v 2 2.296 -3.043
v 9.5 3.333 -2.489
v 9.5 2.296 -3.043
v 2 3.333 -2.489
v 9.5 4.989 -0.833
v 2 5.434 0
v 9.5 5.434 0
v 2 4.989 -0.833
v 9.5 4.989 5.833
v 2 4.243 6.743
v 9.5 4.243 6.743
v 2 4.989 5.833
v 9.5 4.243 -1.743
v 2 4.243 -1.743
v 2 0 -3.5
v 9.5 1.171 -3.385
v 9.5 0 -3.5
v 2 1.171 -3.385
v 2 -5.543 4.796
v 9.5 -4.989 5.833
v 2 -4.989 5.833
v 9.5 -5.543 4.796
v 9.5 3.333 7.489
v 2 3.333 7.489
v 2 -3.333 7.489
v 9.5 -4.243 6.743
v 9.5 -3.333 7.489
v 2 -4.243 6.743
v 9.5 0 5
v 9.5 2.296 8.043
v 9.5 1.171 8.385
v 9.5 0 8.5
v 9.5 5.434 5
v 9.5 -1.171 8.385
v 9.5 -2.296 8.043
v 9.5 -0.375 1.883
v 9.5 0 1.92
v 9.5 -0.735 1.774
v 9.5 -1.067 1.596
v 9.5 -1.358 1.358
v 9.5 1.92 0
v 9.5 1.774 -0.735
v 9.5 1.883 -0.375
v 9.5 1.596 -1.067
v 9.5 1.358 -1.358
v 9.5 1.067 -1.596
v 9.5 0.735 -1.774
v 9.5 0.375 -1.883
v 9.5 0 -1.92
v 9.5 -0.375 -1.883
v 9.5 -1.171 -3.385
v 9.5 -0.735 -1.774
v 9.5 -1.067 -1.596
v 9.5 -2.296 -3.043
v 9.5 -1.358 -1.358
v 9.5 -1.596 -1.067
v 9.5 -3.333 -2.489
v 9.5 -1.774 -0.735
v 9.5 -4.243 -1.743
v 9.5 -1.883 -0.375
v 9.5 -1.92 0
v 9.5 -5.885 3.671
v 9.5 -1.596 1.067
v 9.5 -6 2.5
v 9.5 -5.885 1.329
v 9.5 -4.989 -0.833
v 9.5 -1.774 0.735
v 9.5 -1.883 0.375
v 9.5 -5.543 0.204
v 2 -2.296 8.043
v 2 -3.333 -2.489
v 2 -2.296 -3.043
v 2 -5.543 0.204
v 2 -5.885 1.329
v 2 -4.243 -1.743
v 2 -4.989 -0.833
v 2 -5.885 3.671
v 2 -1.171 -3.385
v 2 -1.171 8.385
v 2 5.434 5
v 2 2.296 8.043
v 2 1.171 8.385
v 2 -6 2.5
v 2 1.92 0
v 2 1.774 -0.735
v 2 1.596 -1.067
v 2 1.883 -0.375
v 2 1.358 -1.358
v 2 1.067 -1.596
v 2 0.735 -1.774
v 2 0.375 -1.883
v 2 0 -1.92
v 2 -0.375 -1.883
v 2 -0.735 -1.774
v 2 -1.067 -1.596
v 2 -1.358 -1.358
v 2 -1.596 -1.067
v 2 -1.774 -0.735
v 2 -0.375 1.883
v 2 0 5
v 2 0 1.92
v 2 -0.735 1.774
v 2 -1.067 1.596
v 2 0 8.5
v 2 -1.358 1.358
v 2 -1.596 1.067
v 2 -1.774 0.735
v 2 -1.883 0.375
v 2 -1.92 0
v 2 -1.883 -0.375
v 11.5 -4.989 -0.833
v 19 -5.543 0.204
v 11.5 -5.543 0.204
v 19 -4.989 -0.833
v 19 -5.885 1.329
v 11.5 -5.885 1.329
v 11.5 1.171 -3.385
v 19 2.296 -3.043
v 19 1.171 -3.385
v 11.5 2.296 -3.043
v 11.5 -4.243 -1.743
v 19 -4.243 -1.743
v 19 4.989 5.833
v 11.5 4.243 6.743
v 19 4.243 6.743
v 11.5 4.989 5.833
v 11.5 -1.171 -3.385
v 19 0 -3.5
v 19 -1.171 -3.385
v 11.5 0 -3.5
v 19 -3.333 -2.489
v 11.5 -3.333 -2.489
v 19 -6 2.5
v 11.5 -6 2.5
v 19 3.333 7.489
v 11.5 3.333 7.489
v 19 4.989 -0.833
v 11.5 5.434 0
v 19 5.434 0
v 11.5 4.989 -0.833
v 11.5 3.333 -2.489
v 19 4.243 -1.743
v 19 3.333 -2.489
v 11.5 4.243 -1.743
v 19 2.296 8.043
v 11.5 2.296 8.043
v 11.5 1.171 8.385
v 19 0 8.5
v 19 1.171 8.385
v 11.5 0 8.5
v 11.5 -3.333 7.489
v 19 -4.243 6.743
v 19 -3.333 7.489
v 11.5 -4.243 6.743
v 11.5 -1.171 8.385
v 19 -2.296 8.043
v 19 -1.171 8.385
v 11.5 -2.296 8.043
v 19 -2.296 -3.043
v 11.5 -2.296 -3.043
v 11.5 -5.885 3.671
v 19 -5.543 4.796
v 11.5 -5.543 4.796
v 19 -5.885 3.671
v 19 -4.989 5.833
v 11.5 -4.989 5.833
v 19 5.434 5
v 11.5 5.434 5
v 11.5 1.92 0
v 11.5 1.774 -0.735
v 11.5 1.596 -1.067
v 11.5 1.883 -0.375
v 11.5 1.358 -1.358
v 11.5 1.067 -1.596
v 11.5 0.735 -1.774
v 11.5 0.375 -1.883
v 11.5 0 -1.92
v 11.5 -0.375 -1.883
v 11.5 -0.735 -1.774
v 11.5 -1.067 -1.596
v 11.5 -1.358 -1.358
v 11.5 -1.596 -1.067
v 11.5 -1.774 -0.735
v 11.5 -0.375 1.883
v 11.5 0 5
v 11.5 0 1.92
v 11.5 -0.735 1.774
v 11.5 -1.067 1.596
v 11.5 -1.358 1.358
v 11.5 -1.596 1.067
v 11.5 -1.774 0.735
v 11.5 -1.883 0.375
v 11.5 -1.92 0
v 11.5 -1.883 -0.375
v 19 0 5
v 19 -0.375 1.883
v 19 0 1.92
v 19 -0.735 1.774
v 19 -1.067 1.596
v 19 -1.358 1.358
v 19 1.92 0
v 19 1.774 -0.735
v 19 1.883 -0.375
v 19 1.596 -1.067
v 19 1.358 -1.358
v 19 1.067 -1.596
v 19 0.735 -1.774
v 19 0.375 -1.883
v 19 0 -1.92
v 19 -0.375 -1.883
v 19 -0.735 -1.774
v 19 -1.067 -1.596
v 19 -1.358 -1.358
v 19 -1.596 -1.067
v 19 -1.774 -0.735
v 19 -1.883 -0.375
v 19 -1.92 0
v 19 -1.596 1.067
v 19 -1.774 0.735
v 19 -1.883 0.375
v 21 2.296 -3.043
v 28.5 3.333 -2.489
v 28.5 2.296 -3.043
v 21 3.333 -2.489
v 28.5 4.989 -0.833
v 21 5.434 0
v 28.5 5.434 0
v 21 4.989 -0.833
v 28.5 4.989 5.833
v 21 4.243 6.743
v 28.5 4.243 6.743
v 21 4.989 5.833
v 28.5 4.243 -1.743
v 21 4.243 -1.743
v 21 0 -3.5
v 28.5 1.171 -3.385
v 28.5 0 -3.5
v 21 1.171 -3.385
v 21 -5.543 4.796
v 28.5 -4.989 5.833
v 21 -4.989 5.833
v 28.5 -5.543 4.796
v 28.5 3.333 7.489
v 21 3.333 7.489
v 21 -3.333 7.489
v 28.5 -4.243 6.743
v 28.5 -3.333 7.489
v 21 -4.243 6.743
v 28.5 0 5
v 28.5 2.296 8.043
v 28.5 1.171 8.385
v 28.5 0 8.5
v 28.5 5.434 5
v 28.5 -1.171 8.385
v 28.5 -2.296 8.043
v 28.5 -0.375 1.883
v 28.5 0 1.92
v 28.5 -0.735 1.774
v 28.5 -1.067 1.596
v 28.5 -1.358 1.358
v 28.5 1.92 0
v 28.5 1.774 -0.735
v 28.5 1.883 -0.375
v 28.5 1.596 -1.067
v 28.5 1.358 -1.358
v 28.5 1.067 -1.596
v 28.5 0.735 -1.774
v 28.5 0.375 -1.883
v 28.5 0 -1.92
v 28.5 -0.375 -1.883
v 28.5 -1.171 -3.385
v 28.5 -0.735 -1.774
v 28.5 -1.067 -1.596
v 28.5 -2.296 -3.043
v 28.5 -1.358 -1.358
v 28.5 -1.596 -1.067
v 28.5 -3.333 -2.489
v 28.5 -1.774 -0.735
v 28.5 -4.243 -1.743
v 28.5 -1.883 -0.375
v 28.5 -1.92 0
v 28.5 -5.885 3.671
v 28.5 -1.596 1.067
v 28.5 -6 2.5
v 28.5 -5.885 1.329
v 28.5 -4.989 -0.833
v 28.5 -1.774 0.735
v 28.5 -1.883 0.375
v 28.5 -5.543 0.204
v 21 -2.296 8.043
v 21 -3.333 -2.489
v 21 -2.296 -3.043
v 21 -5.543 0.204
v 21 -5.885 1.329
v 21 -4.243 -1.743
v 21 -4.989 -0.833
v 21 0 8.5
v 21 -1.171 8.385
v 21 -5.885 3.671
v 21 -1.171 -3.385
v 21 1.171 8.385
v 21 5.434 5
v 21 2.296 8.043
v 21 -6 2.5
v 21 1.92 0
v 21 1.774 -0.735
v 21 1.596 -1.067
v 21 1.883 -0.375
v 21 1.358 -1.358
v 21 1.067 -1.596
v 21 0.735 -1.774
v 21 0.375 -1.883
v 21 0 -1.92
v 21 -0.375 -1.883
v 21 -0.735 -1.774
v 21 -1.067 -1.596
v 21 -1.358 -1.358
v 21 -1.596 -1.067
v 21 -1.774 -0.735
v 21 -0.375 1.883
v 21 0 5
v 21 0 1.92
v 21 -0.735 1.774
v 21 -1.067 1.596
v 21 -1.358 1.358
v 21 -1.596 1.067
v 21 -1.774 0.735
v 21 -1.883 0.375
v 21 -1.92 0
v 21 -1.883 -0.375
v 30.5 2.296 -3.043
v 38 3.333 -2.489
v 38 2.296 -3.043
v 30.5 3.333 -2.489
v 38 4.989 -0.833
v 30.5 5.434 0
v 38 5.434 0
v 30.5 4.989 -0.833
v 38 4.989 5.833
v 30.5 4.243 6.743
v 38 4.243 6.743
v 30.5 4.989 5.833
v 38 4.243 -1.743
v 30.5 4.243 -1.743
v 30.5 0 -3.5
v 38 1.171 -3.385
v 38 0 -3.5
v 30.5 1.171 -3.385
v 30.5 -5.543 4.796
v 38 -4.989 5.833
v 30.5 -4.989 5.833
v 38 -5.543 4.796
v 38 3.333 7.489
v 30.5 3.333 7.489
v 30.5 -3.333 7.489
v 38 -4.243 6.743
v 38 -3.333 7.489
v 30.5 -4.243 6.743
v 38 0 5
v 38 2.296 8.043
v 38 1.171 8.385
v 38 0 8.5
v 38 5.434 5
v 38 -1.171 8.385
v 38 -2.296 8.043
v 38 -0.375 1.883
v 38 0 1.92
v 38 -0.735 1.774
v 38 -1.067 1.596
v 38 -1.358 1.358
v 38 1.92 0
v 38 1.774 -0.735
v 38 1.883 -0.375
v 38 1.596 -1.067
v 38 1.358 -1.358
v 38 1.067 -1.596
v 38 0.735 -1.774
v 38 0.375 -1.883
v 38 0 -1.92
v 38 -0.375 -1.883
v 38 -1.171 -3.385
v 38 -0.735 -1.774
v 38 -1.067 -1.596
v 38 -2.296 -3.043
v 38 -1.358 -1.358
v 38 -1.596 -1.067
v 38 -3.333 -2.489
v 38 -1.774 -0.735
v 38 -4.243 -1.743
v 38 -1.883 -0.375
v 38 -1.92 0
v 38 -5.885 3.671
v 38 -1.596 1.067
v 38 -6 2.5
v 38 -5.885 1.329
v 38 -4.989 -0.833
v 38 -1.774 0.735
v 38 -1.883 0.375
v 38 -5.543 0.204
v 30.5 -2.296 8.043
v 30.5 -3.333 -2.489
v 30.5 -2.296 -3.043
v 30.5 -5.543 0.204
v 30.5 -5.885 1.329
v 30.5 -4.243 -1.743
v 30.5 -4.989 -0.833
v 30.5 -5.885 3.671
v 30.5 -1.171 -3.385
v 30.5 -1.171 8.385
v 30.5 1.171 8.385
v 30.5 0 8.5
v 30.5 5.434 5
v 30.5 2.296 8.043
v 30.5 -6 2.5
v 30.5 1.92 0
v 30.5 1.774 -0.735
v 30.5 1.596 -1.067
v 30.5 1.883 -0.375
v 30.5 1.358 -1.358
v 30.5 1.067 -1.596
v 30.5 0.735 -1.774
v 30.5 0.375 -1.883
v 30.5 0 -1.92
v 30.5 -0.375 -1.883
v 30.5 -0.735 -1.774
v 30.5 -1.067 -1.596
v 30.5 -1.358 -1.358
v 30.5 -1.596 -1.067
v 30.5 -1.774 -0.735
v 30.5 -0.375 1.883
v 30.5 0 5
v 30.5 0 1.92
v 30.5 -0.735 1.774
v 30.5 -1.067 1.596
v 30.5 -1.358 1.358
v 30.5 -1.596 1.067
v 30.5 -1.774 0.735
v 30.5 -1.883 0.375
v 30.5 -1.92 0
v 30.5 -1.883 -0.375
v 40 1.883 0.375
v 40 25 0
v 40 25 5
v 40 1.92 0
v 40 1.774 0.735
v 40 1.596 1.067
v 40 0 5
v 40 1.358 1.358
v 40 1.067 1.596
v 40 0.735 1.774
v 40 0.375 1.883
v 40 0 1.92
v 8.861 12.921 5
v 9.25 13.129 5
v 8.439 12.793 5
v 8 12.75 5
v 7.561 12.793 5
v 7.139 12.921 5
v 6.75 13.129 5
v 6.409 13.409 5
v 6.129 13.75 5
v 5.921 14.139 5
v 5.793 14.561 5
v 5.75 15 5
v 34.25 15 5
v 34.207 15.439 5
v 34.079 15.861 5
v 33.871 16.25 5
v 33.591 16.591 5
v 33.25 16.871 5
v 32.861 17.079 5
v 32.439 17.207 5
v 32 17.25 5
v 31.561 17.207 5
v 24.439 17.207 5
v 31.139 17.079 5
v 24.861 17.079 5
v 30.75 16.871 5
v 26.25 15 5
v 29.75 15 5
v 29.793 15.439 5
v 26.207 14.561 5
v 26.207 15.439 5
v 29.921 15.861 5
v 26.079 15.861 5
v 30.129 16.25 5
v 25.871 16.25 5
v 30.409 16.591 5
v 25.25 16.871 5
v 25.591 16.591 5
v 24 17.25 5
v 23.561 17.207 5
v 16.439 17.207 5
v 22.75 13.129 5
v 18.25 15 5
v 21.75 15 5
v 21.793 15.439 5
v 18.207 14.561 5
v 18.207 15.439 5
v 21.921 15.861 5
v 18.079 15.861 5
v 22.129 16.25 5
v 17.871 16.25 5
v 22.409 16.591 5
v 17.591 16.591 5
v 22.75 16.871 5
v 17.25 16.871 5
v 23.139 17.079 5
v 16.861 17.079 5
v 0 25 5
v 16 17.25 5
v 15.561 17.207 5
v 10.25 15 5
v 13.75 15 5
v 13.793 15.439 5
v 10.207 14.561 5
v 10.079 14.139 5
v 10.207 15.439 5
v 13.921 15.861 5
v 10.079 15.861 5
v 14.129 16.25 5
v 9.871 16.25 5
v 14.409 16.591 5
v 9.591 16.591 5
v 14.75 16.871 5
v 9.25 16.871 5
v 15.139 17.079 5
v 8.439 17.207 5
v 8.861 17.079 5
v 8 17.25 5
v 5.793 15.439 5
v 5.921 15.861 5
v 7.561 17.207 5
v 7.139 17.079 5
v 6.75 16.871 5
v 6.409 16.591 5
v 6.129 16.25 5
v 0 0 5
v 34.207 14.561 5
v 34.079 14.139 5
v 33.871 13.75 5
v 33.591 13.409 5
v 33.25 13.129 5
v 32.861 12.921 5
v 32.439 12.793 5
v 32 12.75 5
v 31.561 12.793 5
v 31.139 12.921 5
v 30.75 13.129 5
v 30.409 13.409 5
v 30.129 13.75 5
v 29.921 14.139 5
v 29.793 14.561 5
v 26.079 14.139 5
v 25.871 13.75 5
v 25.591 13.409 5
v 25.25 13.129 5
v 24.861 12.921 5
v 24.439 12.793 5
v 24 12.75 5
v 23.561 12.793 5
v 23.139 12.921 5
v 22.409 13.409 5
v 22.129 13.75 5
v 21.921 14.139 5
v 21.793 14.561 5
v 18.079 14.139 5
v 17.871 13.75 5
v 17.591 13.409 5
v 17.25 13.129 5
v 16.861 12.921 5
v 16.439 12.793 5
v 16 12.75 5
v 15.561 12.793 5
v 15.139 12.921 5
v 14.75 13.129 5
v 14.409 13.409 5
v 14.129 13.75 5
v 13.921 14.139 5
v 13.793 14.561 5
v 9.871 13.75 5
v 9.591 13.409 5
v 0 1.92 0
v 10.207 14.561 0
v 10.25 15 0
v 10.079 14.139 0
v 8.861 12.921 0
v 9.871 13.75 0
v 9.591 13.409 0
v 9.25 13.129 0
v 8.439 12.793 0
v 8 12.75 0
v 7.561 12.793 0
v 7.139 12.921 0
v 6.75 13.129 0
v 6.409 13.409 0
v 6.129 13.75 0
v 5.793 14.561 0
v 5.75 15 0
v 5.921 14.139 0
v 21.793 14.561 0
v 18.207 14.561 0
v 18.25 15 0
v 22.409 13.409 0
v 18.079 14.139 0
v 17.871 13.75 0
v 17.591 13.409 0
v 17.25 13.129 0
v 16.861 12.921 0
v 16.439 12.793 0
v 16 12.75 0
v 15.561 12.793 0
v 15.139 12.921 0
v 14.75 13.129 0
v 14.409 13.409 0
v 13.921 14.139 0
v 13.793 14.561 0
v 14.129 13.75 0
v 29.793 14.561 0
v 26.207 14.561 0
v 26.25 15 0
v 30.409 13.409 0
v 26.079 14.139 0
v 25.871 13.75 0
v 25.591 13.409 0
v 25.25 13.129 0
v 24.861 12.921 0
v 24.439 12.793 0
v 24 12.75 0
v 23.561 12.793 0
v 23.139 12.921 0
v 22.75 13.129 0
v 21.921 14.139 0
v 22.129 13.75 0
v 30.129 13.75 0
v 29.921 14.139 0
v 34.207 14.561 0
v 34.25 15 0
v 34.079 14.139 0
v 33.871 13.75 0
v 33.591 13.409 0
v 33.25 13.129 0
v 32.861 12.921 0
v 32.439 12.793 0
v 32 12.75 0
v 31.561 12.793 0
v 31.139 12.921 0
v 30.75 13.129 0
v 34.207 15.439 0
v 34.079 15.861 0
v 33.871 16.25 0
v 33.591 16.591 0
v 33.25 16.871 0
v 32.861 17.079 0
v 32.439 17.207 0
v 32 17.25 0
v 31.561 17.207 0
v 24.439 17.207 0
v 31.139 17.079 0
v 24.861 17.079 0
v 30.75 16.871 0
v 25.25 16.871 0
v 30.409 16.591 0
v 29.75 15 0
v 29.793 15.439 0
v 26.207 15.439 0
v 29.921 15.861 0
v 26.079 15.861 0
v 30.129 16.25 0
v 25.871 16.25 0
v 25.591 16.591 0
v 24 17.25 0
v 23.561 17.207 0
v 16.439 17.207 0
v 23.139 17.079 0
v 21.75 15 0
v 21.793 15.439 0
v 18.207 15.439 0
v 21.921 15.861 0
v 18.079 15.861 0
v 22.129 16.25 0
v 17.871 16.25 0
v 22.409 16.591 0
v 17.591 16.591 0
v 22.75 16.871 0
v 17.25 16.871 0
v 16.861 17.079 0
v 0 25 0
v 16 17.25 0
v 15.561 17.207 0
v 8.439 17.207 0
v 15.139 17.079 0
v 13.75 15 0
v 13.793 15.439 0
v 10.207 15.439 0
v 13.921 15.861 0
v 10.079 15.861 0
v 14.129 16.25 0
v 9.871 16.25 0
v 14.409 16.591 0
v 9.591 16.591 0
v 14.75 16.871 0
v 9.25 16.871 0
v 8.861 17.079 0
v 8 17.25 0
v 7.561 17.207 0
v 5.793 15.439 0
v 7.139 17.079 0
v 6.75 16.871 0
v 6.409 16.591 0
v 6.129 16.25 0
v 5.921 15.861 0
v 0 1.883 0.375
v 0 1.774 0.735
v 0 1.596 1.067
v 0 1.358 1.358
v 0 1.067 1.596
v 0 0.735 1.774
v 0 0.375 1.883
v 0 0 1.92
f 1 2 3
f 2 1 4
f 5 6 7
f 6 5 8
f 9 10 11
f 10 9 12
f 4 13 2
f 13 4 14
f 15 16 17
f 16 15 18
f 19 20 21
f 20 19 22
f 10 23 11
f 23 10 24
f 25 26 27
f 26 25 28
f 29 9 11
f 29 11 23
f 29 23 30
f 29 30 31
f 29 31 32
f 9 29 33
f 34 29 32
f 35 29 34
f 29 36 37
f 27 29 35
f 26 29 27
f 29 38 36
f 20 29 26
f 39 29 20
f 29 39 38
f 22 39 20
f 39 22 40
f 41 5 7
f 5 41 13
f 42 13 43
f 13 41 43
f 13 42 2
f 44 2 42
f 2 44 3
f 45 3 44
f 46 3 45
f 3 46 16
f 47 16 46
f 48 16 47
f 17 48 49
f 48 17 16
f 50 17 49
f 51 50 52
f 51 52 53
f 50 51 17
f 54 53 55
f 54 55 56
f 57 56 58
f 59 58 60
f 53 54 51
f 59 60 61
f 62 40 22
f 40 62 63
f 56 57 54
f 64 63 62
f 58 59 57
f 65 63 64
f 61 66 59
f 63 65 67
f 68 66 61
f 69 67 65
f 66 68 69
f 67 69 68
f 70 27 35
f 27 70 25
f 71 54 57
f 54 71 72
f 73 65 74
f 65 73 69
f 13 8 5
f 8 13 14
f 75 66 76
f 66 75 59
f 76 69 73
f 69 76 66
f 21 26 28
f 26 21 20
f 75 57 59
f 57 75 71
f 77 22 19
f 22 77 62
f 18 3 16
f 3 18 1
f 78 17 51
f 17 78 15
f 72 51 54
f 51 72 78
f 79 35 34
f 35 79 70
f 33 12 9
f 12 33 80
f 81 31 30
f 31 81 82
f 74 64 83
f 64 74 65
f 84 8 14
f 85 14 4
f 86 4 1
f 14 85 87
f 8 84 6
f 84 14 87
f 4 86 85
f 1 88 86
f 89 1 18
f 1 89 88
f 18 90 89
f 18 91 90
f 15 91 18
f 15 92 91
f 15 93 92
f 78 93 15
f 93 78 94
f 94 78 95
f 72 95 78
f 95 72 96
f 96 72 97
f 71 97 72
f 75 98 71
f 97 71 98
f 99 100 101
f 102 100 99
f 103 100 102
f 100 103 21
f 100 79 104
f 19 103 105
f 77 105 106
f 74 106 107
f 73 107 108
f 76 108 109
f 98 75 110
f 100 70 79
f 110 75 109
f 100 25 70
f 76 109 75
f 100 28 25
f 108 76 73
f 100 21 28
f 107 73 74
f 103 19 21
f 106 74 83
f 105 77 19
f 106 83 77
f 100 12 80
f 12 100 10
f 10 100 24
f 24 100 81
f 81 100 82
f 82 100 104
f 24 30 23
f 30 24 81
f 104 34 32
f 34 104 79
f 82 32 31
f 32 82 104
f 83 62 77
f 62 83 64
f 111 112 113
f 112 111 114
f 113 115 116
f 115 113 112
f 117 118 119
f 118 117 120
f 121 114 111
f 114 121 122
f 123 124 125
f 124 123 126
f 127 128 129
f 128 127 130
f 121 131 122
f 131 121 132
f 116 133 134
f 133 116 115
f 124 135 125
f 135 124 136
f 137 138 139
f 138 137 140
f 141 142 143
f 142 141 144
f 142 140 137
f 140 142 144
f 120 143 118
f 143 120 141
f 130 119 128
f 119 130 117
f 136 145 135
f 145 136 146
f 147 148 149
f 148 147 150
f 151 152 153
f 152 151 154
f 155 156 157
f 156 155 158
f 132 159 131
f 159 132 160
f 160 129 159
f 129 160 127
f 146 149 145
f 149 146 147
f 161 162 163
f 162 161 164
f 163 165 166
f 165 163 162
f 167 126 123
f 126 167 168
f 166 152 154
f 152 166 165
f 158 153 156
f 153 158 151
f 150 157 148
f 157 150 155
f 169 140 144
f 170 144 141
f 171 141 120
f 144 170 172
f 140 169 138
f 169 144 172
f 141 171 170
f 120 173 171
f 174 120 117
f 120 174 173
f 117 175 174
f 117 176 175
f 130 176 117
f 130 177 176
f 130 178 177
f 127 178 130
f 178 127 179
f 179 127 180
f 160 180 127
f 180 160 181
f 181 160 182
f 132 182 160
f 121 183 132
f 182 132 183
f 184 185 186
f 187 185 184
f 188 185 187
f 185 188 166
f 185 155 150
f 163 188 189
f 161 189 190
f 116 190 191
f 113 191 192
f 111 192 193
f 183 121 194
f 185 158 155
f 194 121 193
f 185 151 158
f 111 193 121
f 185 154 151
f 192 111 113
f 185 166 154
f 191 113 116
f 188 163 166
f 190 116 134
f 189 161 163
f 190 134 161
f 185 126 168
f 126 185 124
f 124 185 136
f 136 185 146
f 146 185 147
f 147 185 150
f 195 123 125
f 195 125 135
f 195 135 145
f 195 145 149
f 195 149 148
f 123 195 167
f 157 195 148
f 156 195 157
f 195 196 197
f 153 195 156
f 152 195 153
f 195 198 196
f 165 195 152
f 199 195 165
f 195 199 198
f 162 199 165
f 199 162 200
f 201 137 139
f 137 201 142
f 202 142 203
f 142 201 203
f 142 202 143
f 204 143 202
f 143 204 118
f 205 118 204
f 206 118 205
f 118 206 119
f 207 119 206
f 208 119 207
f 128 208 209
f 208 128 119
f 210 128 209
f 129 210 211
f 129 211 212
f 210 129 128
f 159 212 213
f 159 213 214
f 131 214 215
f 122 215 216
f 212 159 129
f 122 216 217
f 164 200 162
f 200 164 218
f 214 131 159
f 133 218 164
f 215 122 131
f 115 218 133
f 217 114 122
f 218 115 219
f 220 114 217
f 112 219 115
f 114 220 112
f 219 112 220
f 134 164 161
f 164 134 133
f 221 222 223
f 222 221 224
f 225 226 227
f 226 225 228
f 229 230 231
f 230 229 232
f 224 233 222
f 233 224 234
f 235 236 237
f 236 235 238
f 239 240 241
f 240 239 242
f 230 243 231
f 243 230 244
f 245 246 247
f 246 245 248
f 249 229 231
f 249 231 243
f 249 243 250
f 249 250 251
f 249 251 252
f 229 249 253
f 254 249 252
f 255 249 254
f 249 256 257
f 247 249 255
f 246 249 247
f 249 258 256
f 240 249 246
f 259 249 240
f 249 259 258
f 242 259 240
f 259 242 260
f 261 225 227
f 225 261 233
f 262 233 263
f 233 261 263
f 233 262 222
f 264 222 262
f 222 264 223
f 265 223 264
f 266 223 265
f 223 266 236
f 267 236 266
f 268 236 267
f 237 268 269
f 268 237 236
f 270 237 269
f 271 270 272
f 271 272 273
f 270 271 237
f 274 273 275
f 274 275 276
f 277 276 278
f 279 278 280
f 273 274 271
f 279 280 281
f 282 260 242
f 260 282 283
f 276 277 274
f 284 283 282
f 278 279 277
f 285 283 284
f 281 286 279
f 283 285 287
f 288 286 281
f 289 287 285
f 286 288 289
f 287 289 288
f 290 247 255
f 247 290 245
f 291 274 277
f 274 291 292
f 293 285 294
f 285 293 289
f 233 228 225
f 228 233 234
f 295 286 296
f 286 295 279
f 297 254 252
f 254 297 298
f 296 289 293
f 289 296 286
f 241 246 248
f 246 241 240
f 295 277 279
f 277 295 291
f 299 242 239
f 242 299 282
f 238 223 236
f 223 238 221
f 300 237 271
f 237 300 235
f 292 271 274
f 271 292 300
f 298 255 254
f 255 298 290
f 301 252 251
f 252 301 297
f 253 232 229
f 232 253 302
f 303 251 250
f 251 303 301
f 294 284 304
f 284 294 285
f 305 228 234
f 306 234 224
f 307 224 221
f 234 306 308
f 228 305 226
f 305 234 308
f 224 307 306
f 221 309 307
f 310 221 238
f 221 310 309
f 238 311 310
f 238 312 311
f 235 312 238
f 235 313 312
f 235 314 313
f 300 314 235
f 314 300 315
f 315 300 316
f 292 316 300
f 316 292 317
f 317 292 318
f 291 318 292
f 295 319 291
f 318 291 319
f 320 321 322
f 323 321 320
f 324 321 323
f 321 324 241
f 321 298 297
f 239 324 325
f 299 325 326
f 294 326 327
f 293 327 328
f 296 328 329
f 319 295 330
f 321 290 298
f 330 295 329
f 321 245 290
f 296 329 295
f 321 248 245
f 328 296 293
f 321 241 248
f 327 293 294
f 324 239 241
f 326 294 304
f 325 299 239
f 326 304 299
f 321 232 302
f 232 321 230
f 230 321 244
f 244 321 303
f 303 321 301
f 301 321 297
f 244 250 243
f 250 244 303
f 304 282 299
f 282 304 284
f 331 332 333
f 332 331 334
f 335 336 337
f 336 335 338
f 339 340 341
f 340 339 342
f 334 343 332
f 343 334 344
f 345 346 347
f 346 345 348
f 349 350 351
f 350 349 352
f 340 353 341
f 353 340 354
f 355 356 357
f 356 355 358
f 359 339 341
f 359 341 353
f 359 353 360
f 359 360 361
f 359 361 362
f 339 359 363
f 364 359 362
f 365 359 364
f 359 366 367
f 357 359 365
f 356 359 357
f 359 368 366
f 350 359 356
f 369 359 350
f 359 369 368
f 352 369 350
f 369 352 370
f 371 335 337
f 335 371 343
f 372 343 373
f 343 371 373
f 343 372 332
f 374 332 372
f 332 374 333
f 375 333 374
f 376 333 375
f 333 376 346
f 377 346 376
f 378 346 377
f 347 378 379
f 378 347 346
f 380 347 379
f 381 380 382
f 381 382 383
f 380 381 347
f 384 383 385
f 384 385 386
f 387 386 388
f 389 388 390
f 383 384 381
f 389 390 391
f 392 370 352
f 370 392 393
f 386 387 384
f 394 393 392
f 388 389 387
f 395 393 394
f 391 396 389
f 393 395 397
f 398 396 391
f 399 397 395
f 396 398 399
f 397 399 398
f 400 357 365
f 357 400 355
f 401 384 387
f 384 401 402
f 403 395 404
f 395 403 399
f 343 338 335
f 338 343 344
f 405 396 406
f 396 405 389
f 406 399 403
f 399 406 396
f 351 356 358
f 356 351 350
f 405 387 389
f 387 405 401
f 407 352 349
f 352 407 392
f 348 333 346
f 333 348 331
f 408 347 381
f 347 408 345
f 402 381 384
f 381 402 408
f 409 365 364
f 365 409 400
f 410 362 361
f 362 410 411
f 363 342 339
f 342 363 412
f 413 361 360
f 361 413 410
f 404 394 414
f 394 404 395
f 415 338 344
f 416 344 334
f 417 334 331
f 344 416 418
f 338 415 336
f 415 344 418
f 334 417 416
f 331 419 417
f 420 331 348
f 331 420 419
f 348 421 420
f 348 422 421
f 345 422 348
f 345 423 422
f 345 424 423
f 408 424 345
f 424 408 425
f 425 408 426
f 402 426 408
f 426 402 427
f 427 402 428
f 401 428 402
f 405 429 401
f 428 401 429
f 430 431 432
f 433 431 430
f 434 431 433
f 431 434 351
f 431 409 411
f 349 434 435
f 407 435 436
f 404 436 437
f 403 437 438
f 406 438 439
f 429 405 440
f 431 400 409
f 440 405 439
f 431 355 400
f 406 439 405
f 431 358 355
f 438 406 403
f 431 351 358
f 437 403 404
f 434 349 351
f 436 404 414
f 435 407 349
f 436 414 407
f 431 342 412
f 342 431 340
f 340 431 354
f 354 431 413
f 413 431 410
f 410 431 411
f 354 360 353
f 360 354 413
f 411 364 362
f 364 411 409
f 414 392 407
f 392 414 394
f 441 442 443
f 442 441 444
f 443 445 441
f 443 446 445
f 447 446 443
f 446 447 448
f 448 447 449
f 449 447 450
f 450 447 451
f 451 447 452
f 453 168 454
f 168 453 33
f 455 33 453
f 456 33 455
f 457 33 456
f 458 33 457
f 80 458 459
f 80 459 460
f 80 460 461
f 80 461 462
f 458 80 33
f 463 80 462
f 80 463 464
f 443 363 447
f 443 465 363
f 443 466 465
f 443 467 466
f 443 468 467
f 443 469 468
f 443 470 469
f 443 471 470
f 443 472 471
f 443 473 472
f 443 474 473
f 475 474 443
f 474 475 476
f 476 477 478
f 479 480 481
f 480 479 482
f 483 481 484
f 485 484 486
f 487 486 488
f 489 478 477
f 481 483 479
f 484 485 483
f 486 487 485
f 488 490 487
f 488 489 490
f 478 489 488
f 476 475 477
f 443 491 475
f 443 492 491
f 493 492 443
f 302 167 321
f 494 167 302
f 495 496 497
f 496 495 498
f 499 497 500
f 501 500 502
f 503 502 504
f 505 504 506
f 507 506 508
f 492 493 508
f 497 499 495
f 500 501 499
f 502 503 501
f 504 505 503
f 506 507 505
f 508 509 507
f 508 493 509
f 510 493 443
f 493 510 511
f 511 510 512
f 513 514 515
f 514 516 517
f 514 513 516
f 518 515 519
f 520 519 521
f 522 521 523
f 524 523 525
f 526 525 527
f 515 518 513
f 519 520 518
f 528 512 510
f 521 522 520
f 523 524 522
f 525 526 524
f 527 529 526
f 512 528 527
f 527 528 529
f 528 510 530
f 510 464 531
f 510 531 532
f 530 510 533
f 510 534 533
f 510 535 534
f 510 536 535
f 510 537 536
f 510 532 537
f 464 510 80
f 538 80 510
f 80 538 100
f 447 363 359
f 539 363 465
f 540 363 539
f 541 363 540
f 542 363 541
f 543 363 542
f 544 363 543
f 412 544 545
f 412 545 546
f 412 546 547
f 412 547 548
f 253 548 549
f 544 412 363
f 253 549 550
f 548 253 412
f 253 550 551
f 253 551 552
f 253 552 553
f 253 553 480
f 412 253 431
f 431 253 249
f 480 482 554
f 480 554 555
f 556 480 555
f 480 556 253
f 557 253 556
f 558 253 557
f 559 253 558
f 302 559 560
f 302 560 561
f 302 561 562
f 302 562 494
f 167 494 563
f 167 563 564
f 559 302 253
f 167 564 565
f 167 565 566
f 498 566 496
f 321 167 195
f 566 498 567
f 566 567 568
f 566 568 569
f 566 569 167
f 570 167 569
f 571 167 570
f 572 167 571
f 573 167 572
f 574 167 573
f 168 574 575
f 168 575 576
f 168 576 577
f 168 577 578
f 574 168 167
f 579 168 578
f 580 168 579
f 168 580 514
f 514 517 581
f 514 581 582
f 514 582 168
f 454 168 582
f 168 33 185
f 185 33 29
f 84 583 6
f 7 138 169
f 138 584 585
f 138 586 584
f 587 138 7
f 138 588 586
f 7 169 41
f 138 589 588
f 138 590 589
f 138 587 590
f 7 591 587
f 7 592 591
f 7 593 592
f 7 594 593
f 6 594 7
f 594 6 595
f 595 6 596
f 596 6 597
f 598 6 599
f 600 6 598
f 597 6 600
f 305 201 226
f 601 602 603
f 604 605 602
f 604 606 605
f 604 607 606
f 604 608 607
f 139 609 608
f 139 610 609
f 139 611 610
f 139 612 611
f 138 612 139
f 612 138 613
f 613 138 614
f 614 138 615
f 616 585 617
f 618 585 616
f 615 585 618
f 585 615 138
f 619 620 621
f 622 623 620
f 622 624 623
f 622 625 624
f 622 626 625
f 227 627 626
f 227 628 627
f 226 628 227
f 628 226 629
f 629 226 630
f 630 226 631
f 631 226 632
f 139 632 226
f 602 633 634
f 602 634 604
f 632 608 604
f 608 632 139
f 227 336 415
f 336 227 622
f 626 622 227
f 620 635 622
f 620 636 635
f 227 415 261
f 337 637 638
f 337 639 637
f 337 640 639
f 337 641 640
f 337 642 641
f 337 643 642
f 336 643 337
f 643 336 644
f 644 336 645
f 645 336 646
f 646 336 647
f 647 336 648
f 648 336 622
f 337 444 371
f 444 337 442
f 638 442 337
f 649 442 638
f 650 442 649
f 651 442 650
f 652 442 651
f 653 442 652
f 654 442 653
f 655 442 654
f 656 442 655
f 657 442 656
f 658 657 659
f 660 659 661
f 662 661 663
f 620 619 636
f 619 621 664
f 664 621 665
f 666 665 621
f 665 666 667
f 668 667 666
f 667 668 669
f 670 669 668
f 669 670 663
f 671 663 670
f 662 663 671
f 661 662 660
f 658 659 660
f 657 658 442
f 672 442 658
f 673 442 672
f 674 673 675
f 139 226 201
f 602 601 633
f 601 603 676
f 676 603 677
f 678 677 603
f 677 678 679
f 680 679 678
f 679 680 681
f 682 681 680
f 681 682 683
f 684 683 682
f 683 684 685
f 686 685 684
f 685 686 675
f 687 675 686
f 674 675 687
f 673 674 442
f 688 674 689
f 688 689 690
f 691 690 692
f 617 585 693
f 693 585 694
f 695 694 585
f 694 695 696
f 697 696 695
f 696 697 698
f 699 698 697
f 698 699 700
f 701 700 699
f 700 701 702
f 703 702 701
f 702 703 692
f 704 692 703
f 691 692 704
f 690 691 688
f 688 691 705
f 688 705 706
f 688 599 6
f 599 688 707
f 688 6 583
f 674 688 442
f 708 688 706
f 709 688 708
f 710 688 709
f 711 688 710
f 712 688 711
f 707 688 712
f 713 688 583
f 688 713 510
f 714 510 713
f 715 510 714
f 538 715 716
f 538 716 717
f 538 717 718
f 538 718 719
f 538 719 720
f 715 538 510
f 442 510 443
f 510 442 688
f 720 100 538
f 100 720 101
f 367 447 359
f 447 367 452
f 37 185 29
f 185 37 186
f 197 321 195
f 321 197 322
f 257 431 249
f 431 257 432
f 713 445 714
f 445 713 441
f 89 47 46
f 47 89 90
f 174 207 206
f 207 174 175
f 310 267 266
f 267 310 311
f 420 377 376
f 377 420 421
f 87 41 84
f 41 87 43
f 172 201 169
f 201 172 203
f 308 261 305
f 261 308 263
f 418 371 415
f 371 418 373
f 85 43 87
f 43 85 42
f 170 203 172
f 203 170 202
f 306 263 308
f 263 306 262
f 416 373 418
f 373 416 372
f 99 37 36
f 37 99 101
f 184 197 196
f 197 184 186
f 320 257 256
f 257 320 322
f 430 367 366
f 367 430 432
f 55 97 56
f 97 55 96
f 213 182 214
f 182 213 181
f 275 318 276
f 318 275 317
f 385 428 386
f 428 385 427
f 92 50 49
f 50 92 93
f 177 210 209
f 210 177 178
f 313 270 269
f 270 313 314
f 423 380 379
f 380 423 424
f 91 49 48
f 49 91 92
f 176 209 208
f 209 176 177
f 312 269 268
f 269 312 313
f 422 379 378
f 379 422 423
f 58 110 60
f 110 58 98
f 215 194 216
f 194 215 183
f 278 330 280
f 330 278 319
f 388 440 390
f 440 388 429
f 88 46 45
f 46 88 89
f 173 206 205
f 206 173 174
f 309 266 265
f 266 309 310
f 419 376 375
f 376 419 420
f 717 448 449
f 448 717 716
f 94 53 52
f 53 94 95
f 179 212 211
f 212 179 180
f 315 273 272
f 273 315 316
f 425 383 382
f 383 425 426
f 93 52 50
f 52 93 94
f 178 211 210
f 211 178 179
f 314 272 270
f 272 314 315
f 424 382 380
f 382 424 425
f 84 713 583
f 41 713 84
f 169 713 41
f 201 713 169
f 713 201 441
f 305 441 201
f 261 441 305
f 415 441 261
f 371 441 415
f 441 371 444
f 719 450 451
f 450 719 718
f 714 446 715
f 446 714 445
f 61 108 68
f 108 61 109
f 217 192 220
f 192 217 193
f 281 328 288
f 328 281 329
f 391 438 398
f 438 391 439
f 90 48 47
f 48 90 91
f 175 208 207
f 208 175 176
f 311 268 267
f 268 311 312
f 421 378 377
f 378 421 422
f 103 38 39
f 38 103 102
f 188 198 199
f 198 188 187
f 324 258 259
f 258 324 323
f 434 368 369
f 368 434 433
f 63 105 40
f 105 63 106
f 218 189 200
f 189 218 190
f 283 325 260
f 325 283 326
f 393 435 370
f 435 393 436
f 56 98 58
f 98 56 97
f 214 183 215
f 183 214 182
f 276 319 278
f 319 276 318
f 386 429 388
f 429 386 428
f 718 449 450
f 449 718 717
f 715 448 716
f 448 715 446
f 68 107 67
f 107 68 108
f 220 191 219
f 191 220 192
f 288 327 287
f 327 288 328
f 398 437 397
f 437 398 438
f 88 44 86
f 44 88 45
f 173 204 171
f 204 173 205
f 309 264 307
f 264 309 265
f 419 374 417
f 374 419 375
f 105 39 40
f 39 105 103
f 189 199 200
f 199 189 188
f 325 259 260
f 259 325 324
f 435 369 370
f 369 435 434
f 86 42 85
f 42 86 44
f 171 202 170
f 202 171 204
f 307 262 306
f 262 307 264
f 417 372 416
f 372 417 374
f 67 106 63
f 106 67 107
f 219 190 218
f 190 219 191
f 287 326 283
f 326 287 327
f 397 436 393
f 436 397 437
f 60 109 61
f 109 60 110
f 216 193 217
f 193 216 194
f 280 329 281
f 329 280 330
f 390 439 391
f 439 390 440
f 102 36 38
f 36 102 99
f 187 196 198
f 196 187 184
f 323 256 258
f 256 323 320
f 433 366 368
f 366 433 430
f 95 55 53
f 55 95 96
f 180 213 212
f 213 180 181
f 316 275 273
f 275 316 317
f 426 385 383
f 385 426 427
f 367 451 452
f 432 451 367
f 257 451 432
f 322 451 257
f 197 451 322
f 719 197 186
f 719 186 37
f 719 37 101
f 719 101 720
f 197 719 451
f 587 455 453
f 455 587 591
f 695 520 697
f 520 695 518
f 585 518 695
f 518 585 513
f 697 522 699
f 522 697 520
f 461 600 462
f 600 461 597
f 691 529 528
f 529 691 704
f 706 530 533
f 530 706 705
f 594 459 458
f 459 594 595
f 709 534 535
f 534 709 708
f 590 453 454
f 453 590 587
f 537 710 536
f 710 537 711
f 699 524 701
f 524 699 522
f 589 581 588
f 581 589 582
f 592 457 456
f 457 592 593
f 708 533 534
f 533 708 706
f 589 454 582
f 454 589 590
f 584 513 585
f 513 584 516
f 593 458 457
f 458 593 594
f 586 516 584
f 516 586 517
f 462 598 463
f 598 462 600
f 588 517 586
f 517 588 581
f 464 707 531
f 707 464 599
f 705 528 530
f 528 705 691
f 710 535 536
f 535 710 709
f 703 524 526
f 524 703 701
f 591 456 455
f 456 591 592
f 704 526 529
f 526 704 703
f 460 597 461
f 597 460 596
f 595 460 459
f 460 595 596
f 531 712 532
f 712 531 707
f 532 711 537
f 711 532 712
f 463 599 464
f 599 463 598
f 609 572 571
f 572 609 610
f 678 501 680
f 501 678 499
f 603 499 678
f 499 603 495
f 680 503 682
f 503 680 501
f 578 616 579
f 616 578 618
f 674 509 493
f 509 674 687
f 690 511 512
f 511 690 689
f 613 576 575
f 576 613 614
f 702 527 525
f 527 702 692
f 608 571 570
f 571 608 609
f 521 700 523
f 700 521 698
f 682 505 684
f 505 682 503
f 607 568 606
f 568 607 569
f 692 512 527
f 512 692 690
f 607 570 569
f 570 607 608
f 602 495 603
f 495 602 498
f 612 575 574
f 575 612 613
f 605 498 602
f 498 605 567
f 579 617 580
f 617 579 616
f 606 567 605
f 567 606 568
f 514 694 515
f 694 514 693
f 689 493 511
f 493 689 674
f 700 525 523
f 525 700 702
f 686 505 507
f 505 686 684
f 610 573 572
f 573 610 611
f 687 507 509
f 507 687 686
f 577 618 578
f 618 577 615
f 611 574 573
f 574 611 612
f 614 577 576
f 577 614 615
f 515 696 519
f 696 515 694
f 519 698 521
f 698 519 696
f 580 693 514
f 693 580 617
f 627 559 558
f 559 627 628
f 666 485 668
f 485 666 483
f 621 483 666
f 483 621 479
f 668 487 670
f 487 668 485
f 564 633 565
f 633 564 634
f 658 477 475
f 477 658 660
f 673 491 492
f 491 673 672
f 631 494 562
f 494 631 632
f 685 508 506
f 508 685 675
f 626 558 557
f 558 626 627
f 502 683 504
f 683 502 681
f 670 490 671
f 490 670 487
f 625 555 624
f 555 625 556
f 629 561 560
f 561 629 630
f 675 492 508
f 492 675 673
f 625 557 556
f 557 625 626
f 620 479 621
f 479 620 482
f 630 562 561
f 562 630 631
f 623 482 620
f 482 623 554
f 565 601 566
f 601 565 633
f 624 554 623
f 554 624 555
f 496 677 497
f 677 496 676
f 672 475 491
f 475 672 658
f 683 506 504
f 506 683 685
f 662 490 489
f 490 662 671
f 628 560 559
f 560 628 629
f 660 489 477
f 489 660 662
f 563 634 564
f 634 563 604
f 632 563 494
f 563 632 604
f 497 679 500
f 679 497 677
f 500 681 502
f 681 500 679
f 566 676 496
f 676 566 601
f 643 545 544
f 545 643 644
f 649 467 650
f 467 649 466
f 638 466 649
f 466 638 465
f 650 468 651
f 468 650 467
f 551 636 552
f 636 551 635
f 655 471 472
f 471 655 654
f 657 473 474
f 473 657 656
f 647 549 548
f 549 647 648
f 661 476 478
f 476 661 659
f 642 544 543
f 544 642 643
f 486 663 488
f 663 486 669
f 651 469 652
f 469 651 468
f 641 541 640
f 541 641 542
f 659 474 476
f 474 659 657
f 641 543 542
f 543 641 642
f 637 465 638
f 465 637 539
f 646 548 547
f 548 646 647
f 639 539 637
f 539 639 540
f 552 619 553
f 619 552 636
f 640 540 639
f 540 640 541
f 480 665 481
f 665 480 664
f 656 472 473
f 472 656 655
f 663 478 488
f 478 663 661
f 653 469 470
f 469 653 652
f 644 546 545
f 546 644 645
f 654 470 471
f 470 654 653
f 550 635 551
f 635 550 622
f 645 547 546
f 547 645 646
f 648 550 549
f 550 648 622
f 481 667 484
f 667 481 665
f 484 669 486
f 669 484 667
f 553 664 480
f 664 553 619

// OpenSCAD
$fn = 32;

// ----------------------------------------------------------------------
// Hinge leaf: 40 x 31 x 12 mm
// ----------------------------------------------------------------------

// --- parameters (mm) ---
plate_len = 40;           // leaf length, X
plate_w = 25;             // leaf width, Y
plate_t = 5;              // leaf thickness
barrel_d = 12;            // knuckle diameter
barrel_w = 7.5;           // knuckle width
knuckle_n = 4;            // number of knuckles
pin_d = 3.84;             // pin bore
gap = 2;                  // gap between the knuckles
screw_d = 4.5;            // screw clearance

module leaf() {
  cube([plate_len, plate_w, plate_t]);
}

module knuckles() {
  /* barrels sit on the leaf edge, the pin axis at half the leaf thickness */
  for (i = [0 : knuckle_n - 1])
    translate([gap + i * (barrel_w + gap), 0, plate_t * 0.5])
      rotate([0, 90, 0]) cylinder(h = barrel_w, d = barrel_d);
}

difference() {
  union() {
    leaf();
    knuckles();
  }
  rotate([0, 90, 0]) translate([0, 0, -1])
    cylinder(h = plate_len + 2, d = pin_d);
  translate([8, plate_w * 0.6, -1]) cylinder(h = plate_t + 2, d = screw_d);
  translate([16, plate_w * 0.6, -1]) cylinder(h = plate_t + 2, d = screw_d);
  translate([24, plate_w * 0.6, -1]) cylinder(h = plate_t + 2, d = screw_d);
  translate([32, plate_w * 0.6, -1]) cylinder(h = plate_t + 2, d = screw_d);
}
